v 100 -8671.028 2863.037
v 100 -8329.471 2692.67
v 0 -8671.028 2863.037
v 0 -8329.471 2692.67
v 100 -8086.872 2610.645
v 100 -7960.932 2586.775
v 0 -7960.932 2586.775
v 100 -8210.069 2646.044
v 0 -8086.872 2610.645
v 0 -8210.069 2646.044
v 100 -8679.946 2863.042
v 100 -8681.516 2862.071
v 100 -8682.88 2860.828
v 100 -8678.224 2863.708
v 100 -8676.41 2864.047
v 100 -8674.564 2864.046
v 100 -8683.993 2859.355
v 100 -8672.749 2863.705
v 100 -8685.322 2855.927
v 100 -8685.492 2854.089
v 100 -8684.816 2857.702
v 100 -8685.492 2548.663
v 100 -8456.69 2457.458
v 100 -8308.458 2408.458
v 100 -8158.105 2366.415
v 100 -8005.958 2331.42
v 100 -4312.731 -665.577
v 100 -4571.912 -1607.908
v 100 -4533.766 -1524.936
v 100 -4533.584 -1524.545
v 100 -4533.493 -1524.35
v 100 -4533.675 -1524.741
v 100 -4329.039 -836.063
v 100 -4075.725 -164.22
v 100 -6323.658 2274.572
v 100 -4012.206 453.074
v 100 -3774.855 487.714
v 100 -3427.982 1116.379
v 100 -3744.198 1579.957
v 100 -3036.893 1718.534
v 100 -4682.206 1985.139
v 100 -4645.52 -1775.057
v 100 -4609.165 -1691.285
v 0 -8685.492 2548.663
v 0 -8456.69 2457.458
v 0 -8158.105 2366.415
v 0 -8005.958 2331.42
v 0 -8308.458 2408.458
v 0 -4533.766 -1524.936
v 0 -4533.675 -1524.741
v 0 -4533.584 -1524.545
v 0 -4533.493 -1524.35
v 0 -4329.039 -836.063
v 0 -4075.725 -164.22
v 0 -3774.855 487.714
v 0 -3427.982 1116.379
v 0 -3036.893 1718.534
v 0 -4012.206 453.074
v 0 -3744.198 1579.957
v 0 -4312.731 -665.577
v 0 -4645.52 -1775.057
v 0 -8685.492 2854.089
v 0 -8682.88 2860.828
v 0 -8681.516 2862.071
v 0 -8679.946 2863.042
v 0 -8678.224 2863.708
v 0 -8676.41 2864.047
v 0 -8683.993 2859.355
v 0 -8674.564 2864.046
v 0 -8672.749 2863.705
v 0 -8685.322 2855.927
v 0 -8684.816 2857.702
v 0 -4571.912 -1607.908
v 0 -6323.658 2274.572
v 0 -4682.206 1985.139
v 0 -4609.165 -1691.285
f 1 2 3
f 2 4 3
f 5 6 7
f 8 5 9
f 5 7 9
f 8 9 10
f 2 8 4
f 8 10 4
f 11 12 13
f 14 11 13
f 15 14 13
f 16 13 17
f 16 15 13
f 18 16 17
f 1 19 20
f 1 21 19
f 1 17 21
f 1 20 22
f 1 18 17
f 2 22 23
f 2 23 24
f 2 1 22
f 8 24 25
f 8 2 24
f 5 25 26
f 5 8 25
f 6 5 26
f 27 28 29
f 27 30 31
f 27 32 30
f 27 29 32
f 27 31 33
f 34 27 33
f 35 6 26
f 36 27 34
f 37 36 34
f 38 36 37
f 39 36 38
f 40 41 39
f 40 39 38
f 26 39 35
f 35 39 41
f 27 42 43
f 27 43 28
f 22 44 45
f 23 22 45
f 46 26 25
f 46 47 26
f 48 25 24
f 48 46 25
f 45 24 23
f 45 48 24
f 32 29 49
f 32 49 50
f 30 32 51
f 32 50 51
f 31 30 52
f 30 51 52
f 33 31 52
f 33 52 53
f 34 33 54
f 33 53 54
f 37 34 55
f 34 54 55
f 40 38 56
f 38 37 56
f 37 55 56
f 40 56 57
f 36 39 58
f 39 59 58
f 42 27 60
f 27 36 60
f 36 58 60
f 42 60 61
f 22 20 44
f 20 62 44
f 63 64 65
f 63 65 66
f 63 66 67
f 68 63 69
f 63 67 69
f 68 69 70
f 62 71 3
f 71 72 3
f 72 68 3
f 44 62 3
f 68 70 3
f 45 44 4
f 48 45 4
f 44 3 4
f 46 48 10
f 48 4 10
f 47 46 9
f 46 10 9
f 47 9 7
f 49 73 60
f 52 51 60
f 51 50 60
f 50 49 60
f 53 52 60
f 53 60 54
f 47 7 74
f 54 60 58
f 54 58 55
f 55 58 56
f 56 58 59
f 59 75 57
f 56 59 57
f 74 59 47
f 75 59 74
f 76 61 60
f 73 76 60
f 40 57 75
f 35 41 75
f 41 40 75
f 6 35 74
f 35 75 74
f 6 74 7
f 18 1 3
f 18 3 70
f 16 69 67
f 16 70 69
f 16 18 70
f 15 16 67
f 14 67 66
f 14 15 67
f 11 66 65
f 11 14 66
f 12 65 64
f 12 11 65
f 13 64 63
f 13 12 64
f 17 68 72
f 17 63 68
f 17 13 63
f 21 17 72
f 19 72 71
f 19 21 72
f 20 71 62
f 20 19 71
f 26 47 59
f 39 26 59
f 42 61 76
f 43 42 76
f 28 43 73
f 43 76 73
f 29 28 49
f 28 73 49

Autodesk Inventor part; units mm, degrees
ref_plane "YZ Plane" through (0, 0, 0) normal (1, 0, 0) x (0, 1, 0)
ref_plane "XZ Plane" through (0, 0, 0) normal (0, 1, 0) x (-1, 0, 0)
ref_plane "XY Plane" through (0, 0, 0) normal (0, 0, 1) x (1, 0, 0)
sketch "Sketch1" plane through (0, 0, 0) normal (1, 0, 0) x (0, 1, 0)
  arc A0 (-3036.8928, 1718.534) -> (-4533.7659, -1525.4078) centre (5148.5741, -4025.866) ccw
  line L0 (-2952.6352, 1659.5361) -> (-2978.0832, 1677.355) construction
  arc A1 (-4650.0642, -1800.7835) -> (-4642.0762, -1823.7902) centre (-4600.2584, -1796.3809) ccw
  line L1 (-2978.0832, 1677.355) -> (-3036.8928, 1718.534)
  line L2 (-3036.8928, 1718.534) -> (-7960.9316, 2586.7748) construction
  line L3 (-3036.8928, 1718.534) -> (1963.1072, 1718.534) construction
  line L4 (-4650.0642, -1800.7835) -> (-4639.2556, -1760.4453) construction
  line L5 (-4650.0642, -1800.7835) -> (-1150.0642, -1800.7835) construction
  arc A2 (-8456.6899, 2457.4585) -> (-8005.9575, 2331.4201) centre (-7331.1025, 5613.7675) ccw
  arc A3 (-4533.4927, -1524.3501) -> (-4646.236, -1776.7324) centre (3169.9502, -5116.9769) ccw
  arc A4 (-2938.1875, 1679.4091) -> (-2952.6352, 1659.5361) centre (5142.9986, -4210.7887) ccw construction
  ellipse E0 centre (-3847.8838, -1113.1525) end of major axis (-3847.8838, -1913.1525) minor radius 800 (-4533.7659, -1524.936) -> (-4533.6807, -1525.0779) ccw
  ellipse E1 centre (-3847.8838, -1113.1525) end of major axis (-3847.8838, -1913.1525) minor radius 800 (-4256.7401, -1800.7835) -> (-4256.5248, -1800.9116) ccw
  line L6 (-8329.4706, 2692.6705) -> (-8685.4919, 2870.2518)
  line L7 (-8685.4919, 2870.2518) -> (-8685.4919, 2548.6634)
  line L8 (-8685.4919, 2548.6634) -> (-8456.6899, 2457.4585)
  arc A5 (-8329.4706, 2692.6705) -> (-7960.9316, 2586.7748) centre (-7766.0005, 3959.4195) ccw
  arc A6 (-7960.9316, 2586.7748) -> (-3036.8928, 1718.534) centre (15334.3466, 120303.9359) ccw
  arc A7 (-4645.5197, -1775.0569) -> (-3744.1975, 1579.9568) centre (-42788.682, 10270.6548) ccw
  line L9 (-8005.9575, 2331.4201) -> (-3744.1975, 1579.9568)
  point P0 (0, 0)
  dimension "d0" = 5000
  dimension "d1" = 170
  dimension "d4" = 75
  dimension "d9" = 120000
  dimension "d13" = 40000
extrude "Extrusion2" add sketch "Sketch1" along normal blind 100 contours A0 A3 A7 L9 A2 L8 L7 L6 A5 A6
fillet "Fillet1" radius 10 1 edges at (50, -8685.4919, 2870.2518)
properties part number "side_curve_beam_01" material "Wood (Maple)"
